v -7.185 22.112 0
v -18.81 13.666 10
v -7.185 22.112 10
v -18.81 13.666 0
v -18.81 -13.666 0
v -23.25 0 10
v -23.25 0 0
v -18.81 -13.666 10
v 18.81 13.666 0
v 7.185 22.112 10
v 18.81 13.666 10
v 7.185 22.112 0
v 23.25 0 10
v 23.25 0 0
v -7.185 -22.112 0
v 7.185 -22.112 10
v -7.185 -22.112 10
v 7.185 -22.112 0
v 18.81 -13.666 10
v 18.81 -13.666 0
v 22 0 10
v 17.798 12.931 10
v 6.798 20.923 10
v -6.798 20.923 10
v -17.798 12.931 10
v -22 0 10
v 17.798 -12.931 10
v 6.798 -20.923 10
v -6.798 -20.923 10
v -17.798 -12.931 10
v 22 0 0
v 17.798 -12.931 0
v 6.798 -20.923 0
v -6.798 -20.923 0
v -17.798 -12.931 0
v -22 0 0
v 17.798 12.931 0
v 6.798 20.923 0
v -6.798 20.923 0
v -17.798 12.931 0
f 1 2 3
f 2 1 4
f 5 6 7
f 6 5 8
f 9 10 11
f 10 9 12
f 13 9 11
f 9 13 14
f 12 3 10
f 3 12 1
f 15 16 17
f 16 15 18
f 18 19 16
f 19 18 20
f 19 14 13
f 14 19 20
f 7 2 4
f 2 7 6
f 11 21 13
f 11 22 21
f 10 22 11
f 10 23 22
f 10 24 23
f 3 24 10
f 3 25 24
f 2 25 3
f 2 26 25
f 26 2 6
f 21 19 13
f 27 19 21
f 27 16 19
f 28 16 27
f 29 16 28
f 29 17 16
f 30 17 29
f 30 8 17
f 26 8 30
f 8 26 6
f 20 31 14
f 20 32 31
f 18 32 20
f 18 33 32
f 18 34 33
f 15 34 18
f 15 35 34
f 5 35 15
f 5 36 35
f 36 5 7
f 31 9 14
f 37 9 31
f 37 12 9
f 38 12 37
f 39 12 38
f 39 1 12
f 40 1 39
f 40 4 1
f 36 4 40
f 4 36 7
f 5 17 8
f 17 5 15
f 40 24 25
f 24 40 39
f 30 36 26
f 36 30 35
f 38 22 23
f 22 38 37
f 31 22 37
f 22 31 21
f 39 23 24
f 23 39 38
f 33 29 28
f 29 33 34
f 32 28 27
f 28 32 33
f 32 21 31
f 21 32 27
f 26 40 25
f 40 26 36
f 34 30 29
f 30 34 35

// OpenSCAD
difference() {cylinder(d = 46.5, h = 10, $fn = 10);cylinder(d = 44, h=12, $fn = 10);}
First_Char = "1";
Second_Char = "2";
Third_Char = "3";
Fourth_Char = "4";
Fifth_Char = "5";
Sixth_Char = "6";
Seventh_Char = "7";
Eighth_Char = "8";
Ninth_Char = "9";
Tenth_Char = "10";
translate([2,22.5,2.5]){
    rotate([90,0,180]){text(First_Char, 5);}
}
//text(t, size, font, halign, valign, spacing, direction, language, script)
